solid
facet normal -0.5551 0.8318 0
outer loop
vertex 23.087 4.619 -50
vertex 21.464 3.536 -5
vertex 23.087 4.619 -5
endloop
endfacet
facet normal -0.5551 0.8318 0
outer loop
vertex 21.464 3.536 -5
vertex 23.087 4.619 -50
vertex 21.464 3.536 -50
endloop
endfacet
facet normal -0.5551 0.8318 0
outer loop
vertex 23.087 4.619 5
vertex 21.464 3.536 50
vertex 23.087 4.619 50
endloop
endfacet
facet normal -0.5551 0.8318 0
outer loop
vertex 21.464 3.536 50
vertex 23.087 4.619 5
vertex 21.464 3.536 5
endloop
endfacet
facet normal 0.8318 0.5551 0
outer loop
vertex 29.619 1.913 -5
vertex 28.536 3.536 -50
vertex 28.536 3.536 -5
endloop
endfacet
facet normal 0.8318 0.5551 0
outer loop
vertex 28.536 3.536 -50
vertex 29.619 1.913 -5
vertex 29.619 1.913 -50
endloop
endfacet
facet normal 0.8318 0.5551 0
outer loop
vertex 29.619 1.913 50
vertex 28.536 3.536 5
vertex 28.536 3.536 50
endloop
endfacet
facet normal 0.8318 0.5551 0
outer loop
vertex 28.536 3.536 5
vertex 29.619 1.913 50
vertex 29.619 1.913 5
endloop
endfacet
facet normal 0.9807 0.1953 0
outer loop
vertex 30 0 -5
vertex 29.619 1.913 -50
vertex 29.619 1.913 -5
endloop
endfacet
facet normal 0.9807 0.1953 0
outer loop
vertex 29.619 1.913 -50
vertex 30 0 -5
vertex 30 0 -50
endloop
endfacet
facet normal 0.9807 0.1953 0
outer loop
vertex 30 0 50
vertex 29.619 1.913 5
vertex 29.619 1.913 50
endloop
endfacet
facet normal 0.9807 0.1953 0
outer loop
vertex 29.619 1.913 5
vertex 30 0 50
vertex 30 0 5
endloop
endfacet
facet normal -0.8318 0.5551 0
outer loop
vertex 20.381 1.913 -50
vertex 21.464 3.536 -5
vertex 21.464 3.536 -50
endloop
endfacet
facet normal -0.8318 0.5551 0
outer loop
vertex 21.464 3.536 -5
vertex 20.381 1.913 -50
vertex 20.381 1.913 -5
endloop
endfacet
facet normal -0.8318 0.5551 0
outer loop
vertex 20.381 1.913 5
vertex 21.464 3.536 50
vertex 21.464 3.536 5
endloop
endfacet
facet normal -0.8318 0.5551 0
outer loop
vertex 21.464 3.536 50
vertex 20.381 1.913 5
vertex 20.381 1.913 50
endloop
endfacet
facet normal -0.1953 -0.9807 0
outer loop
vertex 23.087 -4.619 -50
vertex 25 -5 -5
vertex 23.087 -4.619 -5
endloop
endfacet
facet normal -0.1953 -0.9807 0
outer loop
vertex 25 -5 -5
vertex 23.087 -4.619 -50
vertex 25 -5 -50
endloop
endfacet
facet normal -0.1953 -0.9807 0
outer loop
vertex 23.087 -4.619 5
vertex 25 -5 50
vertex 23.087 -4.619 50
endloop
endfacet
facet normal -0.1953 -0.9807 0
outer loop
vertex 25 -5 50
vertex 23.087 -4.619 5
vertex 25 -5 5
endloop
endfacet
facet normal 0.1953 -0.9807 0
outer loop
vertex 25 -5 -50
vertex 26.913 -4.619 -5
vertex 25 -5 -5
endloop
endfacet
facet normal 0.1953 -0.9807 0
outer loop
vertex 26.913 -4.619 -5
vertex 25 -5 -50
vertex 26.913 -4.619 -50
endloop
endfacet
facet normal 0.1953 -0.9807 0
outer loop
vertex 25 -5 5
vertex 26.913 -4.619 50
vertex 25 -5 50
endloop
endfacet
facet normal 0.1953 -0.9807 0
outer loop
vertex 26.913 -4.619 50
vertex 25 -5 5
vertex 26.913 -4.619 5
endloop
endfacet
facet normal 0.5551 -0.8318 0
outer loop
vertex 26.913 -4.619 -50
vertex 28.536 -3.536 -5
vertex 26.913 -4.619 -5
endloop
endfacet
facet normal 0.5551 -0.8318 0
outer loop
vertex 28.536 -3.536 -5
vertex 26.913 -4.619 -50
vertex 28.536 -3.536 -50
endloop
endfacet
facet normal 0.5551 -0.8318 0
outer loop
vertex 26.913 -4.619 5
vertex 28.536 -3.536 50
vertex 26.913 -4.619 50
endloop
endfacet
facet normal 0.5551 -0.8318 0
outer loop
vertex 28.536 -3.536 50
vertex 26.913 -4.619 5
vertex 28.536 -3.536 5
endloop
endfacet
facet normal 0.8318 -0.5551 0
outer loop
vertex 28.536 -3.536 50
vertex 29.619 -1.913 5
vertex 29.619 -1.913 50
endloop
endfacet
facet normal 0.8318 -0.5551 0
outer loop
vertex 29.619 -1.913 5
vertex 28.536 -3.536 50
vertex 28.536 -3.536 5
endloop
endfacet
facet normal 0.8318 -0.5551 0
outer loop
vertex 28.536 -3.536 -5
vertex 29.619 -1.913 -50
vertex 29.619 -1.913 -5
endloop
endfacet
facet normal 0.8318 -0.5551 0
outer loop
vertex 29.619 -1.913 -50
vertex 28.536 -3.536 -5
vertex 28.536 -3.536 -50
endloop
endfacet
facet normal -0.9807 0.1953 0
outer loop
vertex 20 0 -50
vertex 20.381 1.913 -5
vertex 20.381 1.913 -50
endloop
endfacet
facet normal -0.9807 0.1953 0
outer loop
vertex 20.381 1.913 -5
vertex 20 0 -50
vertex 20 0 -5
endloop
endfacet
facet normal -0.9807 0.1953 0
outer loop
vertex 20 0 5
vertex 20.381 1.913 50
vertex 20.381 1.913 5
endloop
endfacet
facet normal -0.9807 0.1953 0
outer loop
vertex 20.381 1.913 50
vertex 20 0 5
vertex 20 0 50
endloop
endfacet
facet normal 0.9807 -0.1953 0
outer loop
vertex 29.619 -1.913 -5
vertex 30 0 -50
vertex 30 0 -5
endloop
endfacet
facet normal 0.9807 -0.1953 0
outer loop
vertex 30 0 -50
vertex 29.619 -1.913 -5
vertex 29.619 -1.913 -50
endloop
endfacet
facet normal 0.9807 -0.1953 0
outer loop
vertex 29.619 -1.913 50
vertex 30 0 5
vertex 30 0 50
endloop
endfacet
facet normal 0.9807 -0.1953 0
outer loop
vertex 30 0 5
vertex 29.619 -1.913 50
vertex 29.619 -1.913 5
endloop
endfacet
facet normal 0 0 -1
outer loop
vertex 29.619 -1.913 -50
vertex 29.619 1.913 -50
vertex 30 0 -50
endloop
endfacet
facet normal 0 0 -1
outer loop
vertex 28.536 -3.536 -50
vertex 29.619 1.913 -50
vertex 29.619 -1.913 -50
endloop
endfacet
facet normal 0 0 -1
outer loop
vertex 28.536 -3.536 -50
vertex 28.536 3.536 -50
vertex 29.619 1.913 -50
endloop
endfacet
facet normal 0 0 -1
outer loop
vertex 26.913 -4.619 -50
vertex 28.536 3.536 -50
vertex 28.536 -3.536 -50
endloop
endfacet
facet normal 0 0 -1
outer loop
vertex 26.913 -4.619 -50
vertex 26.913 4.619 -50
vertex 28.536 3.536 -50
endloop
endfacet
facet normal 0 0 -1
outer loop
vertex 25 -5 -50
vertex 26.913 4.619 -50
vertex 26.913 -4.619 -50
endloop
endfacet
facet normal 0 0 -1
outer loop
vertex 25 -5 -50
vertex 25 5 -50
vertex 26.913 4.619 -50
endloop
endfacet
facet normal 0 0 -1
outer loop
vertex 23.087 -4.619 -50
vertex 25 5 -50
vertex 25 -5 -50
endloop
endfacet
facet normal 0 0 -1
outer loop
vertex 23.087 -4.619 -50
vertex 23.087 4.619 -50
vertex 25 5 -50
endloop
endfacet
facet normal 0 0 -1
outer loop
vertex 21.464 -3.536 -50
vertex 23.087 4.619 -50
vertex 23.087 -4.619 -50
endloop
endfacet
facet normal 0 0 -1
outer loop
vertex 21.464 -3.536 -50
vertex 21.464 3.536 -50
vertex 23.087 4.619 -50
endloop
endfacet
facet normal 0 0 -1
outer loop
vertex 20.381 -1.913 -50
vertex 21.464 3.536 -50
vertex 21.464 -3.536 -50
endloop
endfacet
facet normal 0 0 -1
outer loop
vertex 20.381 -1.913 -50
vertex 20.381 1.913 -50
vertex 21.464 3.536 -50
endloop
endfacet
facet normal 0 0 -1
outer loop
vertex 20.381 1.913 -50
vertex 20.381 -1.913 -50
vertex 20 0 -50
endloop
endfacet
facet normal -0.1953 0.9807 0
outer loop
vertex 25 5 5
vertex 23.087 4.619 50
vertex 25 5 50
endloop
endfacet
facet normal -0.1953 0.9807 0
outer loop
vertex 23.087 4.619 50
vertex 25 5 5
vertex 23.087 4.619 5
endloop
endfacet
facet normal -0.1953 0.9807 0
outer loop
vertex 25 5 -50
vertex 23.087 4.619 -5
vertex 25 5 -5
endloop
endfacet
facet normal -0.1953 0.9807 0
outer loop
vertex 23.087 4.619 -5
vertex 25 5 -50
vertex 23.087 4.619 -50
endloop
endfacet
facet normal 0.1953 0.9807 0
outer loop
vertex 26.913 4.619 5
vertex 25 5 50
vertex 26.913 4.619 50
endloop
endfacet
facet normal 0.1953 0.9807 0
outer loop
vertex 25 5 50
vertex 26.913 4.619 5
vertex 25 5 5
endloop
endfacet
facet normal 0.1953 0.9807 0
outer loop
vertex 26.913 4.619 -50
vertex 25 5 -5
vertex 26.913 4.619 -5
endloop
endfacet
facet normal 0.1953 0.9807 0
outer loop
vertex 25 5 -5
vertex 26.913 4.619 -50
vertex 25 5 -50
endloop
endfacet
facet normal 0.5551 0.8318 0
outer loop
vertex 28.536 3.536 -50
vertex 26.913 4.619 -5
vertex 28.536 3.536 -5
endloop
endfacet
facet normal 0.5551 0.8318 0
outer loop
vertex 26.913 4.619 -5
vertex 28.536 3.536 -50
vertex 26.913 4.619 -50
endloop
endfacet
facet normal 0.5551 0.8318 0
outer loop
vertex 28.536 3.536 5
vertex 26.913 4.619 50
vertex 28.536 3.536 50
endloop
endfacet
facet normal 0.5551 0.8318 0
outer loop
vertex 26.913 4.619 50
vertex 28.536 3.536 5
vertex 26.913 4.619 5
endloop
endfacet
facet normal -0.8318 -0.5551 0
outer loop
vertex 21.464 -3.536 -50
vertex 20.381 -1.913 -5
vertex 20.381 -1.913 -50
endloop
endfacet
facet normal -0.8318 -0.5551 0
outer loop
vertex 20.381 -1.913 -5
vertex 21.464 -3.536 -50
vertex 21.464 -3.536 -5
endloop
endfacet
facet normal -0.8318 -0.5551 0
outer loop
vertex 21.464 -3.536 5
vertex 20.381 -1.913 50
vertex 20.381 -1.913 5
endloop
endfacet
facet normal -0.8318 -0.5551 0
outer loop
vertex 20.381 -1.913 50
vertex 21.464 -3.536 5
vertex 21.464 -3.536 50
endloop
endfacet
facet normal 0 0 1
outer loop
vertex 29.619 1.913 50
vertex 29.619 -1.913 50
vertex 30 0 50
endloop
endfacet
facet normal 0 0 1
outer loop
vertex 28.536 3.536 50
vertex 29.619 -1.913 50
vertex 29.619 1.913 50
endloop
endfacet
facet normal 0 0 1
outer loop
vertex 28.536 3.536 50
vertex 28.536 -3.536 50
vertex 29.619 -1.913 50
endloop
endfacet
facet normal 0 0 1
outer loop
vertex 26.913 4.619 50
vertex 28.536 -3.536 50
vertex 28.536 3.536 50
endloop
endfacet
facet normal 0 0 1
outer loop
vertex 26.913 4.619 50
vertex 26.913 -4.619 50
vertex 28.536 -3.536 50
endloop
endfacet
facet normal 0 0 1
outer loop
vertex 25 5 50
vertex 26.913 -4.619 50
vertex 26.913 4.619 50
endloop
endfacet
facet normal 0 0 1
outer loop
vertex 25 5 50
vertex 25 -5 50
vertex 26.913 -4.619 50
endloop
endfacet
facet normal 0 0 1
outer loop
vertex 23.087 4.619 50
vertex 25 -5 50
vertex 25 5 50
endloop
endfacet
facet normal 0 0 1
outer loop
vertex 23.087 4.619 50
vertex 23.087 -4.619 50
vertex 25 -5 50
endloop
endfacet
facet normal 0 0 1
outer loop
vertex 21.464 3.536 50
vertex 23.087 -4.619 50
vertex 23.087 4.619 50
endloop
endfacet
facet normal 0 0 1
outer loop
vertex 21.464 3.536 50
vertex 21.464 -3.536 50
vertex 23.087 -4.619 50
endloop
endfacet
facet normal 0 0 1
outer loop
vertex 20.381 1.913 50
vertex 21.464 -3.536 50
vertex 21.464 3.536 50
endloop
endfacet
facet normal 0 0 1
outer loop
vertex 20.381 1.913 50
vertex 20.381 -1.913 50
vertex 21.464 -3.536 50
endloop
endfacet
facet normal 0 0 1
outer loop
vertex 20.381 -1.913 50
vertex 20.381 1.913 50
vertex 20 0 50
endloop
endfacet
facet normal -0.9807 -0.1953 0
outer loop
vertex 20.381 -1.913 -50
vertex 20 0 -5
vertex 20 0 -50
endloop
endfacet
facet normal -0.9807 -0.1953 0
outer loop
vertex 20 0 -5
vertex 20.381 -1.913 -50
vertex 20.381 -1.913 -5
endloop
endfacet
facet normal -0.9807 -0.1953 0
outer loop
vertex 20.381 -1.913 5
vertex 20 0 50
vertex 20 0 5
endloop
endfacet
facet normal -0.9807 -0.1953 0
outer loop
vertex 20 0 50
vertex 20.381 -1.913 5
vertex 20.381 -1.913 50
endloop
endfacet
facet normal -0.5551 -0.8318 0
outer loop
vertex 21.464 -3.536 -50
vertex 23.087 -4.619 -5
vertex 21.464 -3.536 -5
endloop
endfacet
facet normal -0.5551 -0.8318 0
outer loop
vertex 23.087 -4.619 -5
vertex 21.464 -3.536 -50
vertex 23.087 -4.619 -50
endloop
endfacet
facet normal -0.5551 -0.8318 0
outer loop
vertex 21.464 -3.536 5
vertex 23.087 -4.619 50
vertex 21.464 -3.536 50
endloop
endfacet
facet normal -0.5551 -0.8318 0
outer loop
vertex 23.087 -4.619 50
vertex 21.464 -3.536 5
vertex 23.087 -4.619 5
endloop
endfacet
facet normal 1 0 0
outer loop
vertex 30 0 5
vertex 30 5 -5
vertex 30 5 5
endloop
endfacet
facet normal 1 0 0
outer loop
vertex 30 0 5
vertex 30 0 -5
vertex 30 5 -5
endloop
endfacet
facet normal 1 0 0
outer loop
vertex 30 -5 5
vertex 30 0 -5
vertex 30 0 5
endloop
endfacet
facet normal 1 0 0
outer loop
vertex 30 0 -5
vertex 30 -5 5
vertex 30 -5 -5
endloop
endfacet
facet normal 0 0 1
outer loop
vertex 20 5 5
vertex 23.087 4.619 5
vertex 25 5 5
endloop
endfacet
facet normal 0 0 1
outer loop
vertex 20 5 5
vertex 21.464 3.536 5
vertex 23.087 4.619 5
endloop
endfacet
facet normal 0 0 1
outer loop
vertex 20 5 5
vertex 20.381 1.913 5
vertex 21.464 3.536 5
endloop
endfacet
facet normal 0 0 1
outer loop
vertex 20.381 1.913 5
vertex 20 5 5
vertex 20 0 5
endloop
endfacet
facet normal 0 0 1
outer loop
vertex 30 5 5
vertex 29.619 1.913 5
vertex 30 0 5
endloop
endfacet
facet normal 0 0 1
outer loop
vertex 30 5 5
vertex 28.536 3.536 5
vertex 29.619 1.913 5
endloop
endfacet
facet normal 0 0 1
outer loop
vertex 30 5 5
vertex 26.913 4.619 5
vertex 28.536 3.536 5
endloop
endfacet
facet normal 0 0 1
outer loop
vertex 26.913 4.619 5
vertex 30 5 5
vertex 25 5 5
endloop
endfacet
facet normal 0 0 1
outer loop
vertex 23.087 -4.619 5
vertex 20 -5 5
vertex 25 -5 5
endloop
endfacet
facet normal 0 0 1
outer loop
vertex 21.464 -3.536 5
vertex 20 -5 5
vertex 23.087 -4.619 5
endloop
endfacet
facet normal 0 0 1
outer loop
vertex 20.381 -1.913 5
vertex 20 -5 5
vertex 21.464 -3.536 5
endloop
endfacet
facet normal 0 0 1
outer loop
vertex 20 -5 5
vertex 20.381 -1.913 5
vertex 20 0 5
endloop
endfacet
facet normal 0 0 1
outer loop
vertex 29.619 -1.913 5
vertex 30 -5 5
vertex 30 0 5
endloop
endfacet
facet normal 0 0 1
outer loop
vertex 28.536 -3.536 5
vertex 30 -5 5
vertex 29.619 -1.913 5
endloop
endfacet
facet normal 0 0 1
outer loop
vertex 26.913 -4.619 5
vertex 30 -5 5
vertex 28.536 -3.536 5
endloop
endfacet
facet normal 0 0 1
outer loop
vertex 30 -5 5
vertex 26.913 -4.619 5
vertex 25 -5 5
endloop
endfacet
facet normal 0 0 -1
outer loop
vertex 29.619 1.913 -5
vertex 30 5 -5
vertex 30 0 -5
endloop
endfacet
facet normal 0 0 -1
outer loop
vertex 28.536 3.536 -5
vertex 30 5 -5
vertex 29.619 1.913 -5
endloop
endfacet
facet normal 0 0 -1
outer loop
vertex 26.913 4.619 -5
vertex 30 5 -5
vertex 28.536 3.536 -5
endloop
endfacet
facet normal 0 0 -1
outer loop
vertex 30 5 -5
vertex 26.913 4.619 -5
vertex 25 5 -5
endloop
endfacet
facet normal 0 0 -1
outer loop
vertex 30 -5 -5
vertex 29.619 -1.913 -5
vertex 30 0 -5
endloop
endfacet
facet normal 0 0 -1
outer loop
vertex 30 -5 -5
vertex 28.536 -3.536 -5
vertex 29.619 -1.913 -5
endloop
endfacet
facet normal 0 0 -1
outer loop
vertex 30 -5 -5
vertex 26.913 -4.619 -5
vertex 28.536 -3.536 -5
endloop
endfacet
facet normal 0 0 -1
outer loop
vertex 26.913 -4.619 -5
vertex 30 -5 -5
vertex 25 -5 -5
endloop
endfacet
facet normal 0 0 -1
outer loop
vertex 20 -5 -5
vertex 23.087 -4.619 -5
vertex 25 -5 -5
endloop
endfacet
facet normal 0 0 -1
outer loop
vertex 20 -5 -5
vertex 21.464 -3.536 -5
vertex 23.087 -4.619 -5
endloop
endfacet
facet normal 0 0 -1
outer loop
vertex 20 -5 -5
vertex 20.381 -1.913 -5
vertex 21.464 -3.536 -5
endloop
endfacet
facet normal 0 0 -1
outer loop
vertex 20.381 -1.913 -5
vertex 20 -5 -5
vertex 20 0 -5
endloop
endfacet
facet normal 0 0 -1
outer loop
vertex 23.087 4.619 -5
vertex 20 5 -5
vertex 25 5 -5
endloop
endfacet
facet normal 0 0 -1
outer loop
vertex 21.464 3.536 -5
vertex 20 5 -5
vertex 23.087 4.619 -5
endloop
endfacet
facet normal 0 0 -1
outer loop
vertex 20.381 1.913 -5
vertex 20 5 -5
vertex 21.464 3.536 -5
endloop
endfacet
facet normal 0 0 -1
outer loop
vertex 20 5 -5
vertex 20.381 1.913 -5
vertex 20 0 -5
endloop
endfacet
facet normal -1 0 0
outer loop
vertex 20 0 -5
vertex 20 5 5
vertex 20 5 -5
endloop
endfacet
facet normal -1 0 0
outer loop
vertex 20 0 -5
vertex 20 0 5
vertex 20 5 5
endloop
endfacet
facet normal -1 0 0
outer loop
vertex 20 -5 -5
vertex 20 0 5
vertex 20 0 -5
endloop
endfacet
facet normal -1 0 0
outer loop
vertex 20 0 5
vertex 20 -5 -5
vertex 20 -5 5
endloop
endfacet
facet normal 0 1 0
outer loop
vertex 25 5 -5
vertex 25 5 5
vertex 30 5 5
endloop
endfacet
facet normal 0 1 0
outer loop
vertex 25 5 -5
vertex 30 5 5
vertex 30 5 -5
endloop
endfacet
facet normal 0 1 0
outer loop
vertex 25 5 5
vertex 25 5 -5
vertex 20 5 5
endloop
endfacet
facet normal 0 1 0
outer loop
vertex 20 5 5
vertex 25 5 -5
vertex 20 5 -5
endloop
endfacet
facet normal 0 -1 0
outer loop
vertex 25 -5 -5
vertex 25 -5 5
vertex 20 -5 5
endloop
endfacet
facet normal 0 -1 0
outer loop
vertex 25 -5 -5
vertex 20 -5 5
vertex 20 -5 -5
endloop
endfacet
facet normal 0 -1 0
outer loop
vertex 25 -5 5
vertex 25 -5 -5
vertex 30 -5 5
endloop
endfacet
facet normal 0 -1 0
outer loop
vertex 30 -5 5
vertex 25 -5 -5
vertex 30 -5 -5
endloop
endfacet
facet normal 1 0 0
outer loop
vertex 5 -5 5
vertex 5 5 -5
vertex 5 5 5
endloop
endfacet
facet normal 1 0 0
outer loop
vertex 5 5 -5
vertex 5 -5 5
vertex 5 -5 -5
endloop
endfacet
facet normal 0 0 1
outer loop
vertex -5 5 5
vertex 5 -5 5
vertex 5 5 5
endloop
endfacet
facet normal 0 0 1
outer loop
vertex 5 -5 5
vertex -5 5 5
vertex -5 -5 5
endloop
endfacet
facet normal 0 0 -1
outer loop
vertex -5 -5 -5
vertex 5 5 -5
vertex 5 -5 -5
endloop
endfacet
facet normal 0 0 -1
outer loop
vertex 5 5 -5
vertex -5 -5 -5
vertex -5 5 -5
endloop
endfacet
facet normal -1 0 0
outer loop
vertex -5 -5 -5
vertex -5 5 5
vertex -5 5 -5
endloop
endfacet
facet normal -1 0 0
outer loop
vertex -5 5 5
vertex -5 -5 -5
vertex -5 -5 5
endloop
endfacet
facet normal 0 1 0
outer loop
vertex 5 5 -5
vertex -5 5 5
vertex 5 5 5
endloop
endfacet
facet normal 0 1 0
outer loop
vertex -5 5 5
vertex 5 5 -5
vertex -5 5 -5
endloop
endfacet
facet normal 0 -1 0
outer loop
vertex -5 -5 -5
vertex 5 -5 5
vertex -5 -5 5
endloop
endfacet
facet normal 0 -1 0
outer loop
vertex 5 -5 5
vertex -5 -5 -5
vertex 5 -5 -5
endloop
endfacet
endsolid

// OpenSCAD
module hole(size) {
	cylinder(r = size, h = 100, center = true); 
	cube(size=[10, 10, 10], center=true); 
} 

translate([25, 0, 0]) {
	hole(5); 
} 

cube(size=[10, 10, 10], center=true);
